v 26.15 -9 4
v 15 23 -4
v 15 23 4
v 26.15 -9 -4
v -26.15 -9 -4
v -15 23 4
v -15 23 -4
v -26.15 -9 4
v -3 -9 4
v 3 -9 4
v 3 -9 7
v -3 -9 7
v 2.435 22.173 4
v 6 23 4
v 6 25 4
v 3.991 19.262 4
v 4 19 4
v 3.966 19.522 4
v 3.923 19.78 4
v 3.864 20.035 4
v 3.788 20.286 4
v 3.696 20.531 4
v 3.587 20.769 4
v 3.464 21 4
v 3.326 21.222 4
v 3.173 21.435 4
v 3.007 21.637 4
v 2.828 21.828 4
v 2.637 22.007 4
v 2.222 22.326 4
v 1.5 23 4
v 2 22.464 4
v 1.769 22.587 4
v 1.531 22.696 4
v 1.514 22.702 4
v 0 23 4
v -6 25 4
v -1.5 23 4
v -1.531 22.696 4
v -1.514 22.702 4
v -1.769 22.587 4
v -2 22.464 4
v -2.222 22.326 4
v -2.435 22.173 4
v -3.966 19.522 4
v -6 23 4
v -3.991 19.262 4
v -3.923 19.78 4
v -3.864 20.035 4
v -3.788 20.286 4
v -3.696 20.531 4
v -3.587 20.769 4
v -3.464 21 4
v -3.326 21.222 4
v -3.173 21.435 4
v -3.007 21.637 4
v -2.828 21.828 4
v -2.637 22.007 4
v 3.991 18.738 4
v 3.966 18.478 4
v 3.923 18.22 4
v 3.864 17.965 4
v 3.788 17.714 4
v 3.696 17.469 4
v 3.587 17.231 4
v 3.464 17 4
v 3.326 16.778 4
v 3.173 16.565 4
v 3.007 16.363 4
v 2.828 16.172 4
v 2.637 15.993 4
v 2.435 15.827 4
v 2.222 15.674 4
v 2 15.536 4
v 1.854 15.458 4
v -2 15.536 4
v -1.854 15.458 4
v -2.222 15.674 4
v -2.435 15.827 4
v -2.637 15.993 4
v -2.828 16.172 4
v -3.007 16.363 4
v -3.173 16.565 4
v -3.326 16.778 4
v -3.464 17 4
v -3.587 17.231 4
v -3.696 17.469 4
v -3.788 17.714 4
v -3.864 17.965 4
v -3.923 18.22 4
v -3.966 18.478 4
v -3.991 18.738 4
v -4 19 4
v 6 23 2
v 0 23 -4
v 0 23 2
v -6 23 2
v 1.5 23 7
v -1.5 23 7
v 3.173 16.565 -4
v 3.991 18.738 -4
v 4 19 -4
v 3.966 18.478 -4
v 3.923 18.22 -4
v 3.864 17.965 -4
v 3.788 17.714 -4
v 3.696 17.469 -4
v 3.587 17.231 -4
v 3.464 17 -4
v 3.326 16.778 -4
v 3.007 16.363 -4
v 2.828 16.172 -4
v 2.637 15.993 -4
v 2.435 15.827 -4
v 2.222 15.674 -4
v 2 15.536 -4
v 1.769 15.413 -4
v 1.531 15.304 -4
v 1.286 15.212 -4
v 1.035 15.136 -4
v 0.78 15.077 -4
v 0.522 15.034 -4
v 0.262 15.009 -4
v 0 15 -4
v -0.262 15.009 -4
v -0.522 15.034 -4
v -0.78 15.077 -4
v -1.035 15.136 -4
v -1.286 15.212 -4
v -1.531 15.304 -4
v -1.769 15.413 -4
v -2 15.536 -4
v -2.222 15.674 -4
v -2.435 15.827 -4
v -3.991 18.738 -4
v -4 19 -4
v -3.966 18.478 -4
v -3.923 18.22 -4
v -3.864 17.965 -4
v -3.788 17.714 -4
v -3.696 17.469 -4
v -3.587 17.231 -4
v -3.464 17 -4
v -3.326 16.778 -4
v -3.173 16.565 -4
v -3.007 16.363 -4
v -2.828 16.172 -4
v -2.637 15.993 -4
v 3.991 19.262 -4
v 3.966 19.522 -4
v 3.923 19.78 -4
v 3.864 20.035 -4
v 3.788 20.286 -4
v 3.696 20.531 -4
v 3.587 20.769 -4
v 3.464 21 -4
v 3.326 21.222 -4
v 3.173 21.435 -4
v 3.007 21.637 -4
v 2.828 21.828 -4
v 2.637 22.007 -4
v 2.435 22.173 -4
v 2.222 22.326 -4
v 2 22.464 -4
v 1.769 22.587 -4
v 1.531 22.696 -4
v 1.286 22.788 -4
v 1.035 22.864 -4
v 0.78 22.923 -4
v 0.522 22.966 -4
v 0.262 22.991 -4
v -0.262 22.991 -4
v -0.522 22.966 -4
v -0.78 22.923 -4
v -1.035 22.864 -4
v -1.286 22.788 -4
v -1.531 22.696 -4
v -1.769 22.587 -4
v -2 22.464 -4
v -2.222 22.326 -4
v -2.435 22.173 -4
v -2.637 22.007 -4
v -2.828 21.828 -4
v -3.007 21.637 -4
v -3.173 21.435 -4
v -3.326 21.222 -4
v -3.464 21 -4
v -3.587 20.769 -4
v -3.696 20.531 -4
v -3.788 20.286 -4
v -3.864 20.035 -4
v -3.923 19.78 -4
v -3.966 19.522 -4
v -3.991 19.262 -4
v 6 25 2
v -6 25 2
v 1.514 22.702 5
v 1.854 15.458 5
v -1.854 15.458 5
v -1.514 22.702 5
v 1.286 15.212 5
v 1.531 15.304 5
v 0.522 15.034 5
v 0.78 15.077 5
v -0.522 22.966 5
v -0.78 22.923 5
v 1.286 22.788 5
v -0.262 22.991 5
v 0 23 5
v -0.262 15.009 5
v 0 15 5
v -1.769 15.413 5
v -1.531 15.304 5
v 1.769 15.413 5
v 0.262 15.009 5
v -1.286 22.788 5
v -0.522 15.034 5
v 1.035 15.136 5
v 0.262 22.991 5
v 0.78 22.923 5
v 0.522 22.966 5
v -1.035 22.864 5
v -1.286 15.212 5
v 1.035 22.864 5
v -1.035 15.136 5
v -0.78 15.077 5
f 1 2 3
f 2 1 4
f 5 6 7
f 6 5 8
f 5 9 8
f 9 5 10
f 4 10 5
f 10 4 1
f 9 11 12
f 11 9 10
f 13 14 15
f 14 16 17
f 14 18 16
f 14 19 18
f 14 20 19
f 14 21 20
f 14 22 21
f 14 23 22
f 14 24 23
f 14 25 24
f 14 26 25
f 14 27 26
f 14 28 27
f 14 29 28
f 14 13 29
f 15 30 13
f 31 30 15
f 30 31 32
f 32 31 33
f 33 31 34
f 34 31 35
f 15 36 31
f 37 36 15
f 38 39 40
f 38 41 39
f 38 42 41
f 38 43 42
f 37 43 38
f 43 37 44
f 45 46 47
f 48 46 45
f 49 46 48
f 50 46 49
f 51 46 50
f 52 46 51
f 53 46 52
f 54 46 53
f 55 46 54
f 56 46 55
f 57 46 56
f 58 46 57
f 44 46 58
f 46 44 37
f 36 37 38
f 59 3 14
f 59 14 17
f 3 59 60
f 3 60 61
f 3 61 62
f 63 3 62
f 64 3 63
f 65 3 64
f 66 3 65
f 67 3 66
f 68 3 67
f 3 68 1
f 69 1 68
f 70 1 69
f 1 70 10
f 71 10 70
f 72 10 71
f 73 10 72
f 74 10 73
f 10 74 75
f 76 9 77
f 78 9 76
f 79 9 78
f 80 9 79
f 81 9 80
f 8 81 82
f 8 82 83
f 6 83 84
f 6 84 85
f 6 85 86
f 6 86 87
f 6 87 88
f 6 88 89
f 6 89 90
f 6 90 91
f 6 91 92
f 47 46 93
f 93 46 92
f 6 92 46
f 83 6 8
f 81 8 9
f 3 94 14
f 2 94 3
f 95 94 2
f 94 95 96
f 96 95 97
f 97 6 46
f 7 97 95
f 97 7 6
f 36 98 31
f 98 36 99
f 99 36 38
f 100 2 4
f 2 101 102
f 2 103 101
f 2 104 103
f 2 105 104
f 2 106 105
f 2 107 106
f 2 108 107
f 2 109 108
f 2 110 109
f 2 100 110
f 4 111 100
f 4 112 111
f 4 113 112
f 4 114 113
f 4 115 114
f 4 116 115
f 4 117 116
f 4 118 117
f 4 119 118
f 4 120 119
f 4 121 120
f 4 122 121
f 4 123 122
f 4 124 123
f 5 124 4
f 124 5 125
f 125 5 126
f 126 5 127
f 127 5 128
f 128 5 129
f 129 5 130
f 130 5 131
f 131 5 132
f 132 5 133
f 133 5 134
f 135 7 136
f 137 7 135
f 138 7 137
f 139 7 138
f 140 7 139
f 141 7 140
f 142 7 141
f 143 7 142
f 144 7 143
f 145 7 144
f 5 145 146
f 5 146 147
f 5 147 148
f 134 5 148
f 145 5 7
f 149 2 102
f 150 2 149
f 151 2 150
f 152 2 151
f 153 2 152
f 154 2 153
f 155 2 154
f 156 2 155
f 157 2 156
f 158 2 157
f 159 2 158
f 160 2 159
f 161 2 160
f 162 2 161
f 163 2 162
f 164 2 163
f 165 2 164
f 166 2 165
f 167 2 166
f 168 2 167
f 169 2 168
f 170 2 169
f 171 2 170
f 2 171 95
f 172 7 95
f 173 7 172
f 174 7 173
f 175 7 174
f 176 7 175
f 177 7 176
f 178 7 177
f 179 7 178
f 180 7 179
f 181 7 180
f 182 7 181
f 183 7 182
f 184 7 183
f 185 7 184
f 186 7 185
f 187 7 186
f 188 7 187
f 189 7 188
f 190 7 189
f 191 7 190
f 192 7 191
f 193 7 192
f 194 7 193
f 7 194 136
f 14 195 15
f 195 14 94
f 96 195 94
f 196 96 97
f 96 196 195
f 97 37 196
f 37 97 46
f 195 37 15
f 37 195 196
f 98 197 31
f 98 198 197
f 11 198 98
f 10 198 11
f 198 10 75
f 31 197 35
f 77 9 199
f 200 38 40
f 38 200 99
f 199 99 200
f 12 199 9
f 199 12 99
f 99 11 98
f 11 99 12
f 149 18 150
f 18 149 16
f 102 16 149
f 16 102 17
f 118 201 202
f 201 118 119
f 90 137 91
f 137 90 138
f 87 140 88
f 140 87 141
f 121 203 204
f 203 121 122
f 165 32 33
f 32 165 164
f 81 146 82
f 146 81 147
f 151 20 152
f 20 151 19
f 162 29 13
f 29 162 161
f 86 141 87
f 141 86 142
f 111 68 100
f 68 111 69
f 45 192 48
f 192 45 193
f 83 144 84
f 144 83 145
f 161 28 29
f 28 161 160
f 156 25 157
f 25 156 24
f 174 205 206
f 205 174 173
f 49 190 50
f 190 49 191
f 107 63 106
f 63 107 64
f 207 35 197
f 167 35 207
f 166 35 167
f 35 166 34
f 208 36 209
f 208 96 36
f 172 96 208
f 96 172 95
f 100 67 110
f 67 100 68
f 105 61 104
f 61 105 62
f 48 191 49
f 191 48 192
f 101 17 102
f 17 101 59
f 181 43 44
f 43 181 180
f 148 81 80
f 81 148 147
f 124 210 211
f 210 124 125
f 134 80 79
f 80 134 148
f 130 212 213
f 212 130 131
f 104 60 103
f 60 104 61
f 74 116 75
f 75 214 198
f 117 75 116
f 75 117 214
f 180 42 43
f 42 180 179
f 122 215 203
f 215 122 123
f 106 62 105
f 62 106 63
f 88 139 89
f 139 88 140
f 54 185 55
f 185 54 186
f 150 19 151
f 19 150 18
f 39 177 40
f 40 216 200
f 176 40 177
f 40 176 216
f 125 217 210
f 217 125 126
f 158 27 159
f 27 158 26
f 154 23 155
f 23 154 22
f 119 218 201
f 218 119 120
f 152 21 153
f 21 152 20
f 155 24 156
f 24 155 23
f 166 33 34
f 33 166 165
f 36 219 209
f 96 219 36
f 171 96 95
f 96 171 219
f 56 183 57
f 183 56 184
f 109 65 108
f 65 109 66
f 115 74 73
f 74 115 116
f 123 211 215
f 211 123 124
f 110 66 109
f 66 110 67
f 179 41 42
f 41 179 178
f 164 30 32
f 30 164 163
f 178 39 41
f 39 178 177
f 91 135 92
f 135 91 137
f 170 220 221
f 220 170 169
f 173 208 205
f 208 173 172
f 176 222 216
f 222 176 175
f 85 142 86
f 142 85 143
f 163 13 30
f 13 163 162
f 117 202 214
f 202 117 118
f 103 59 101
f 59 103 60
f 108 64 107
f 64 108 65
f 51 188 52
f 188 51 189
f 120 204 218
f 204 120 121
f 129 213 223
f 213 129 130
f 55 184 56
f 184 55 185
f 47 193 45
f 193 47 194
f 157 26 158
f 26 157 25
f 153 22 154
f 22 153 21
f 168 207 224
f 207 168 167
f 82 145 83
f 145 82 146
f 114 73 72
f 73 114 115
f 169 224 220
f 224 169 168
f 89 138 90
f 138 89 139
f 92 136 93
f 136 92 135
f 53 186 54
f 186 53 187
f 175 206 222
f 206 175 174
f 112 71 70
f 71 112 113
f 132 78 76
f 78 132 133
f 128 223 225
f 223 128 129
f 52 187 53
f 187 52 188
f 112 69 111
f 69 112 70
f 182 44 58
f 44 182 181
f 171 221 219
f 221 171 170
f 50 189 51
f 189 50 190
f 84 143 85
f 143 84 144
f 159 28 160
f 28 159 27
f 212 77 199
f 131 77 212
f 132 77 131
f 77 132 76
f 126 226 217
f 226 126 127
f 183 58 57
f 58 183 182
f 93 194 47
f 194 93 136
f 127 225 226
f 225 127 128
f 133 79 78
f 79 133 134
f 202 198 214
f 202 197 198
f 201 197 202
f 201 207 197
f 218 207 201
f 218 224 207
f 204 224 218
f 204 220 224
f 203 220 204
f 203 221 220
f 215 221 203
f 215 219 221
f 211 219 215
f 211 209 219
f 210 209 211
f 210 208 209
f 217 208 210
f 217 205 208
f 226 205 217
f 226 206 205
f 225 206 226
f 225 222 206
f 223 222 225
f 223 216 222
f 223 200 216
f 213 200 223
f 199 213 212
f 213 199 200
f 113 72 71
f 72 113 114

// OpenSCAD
$fn=96;

bbox_x = 52.3;
bbox_y = 50.0;
bbox_z = 38.8;

th = 8.0;

stem_len = 18.0;
stem_w = 18.0;

plate_len = bbox_y - stem_len; // 32
plate_w_front = bbox_x;        // 52.3
plate_w_back  = 30.0;

step_in = 3.0;
step_h = 2.0;

hole_d = 8.0;
hole_y_from_end = 6.0;

ridge_w = 6.0;
ridge_h = 3.0;

module v_plate(len, w0, w1, t){
    linear_extrude(height=t, center=true, convexity=10)
        polygon(points=[
            [-w0/2, 0],
            [ w0/2, 0],
            [ w1/2, len],
            [-w1/2, len]
        ]);
}

module stem(len, w, t){
    translate([0, -len/2, 0])
        cube([w, len, t], center=true);
}

module stepped_shell(){
    union(){
        // Main body
        union(){
            translate([0, -bbox_y/2 + plate_len/2, 0])
                v_plate(plate_len, plate_w_front, plate_w_back, th);

            translate([0, bbox_y/2 - stem_len/2, 0])
                stem(stem_len, stem_w, th);
        }

        // Side step (raised rim) on V-plate
        translate([0, -bbox_y/2 + plate_len/2, th/2 - step_h/2])
            v_plate(plate_len, plate_w_front - 2*step_in, plate_w_back - 2*step_in, step_h);

        // Side step on stem
        translate([0, bbox_y/2 - stem_len/2, th/2 - step_h/2])
            cube([stem_w - 2*step_in, stem_len, step_h], center=true);

        // Central ridge/crease along V-plate
        translate([0, -bbox_y/2 + plate_len/2, th/2 + ridge_h/2])
            linear_extrude(height=ridge_h, center=true, convexity=10)
                polygon(points=[
                    [-ridge_w/2, 0],
                    [ ridge_w/2, 0],
                    [ ridge_w/4, plate_len],
                    [-ridge_w/4, plate_len]
                ]);
    }
}

module hole(){
    translate([0, bbox_y/2 - hole_y_from_end, 0])
        cylinder(d=hole_d, h=th+2, center=true);
}

difference(){
    stepped_shell();
    hole();
}
